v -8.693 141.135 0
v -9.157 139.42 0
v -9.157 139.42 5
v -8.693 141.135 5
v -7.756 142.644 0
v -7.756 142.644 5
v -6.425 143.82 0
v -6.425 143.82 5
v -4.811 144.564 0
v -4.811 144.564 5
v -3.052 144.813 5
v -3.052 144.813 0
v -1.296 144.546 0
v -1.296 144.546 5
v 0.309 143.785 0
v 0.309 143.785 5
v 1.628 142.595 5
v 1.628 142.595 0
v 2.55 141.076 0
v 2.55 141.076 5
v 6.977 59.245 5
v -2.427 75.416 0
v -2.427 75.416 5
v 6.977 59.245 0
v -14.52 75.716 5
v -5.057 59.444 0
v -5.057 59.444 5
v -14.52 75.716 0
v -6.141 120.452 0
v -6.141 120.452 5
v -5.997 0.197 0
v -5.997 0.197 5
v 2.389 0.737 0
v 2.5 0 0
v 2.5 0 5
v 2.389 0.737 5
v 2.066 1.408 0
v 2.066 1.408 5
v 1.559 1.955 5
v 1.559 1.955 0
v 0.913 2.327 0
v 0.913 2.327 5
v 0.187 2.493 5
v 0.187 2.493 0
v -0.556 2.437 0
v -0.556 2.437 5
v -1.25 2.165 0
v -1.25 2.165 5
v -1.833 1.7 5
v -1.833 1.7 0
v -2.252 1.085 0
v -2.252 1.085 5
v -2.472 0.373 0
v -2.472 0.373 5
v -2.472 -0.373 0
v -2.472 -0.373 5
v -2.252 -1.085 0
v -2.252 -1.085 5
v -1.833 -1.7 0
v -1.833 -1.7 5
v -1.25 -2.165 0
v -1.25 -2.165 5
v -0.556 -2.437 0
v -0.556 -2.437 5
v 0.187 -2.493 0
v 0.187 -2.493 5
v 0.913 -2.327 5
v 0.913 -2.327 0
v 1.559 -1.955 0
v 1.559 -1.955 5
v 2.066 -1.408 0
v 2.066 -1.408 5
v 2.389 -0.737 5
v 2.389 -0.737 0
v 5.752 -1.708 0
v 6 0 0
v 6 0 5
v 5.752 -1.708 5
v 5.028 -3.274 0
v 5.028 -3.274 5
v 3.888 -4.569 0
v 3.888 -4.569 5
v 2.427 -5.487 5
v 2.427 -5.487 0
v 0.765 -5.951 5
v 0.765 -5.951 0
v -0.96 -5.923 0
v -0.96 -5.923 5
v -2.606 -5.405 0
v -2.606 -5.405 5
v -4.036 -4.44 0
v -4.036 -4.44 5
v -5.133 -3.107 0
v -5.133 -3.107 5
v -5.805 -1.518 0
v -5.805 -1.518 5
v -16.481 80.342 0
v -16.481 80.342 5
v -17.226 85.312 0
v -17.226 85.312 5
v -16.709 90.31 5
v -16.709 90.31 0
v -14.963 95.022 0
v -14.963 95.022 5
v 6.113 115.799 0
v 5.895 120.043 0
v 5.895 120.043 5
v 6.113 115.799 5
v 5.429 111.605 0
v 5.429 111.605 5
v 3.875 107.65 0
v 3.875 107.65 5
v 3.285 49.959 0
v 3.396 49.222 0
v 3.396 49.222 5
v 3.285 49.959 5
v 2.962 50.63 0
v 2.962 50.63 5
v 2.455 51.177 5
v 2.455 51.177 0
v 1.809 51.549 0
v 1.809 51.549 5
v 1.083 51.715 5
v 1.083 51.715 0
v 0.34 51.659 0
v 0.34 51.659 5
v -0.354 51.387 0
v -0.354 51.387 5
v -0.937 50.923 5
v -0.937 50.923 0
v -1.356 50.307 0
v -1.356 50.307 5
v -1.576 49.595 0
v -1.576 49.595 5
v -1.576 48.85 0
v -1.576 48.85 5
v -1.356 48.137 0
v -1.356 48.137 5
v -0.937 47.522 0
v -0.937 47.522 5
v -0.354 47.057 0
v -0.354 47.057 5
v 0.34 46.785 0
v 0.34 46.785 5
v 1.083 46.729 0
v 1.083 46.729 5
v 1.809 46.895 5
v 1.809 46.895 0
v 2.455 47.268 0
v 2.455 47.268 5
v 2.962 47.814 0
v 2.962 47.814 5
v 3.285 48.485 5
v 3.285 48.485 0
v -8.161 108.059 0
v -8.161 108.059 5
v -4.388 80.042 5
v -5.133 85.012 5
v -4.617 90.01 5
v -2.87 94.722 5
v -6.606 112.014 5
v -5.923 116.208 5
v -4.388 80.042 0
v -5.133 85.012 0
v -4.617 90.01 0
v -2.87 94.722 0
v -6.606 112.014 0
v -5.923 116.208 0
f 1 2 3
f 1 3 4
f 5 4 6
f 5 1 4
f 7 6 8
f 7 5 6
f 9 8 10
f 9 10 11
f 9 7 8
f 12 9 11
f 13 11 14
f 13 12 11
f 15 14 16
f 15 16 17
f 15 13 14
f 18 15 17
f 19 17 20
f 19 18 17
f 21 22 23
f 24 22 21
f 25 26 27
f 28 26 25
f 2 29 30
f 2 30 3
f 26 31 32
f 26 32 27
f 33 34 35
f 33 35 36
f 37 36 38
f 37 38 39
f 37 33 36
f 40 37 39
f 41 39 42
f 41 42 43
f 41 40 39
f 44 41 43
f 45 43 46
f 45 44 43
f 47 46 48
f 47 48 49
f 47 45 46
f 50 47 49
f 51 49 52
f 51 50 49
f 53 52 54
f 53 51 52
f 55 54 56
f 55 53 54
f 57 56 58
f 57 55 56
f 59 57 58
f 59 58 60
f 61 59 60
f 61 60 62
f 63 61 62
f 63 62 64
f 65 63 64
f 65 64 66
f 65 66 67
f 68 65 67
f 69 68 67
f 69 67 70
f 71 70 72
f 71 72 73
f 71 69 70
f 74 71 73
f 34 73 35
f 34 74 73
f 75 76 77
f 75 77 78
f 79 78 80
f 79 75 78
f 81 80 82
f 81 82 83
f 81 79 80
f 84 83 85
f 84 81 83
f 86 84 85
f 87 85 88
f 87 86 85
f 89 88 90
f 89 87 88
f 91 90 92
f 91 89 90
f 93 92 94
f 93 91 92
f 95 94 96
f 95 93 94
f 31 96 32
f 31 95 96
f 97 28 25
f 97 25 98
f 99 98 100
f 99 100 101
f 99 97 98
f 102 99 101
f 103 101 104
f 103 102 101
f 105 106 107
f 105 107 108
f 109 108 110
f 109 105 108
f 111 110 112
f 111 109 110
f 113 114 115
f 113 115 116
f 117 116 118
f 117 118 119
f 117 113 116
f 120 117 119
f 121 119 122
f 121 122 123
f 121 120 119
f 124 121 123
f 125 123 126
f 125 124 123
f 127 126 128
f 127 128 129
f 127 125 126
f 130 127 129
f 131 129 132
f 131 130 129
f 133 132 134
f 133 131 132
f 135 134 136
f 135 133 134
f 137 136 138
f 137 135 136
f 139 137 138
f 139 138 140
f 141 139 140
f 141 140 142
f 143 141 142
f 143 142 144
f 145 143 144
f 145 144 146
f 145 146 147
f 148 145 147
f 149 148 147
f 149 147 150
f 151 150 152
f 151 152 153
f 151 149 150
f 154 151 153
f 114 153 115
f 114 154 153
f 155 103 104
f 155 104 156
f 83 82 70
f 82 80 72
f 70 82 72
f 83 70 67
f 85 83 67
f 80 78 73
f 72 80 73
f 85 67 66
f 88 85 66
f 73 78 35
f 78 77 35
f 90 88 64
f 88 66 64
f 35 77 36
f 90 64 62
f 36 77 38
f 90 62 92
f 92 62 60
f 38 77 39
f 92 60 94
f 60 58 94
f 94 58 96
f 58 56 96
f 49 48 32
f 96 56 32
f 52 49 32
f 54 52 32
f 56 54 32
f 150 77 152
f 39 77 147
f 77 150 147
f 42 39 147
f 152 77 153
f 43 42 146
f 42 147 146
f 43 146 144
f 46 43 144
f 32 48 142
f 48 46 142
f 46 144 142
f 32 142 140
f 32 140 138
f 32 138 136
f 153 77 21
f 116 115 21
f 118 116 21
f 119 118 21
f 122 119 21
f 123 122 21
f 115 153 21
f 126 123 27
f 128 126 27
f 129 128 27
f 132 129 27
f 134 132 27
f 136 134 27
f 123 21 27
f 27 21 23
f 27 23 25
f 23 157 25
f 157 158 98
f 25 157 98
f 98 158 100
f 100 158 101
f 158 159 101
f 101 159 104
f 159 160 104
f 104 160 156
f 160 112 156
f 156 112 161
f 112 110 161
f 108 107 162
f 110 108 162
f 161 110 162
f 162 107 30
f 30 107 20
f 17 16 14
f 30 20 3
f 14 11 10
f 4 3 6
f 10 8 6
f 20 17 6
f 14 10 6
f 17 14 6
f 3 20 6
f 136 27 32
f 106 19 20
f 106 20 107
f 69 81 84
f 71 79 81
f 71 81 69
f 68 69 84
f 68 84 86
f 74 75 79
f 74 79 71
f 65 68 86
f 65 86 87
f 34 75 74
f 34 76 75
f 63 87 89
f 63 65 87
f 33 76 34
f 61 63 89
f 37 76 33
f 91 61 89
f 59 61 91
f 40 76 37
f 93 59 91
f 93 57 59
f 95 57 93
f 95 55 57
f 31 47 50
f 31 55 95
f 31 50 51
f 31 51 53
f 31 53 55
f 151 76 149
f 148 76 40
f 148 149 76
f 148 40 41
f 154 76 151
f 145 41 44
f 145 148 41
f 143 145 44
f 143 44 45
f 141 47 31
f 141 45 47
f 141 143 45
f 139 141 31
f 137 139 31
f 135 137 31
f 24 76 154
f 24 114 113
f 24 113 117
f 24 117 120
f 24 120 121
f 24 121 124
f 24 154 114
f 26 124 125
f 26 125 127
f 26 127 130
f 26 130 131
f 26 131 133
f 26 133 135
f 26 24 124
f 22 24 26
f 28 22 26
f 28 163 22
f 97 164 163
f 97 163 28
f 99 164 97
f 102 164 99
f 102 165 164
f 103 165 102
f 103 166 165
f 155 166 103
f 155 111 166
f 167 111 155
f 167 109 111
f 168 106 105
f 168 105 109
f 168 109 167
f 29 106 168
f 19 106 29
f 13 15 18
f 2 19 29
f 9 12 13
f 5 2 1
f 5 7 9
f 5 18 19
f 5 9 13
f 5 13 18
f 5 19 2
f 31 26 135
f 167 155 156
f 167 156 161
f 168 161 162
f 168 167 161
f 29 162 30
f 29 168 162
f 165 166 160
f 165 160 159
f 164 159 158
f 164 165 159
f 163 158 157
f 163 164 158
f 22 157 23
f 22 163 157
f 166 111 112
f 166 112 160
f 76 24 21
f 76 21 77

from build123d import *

# Parameters (mm, degrees)
SKETCH_1_R      = 2.5
EXTRUDE_1_DEPTH = 5


with BuildPart() as part:
    # Эскиз1 → Вытянуть1 (new body)
    with BuildSketch(Plane.XY):
        with BuildLine():
            Line((-5.996779713, 0.196552972), (-5.056999721, 59.443873761))
            Line((-5.056999721, 59.443873761), (-14.520173102, 75.715501286))
            ThreePointArc((-14.520173102, 75.715501286), (-17.226120819, 85.311611147), (-14.963001631, 95.021697091))
            Line((-14.963001631, 95.021697091), (-8.160722176, 108.059141137))
            ThreePointArc((-8.160722176, 108.059141137), (-6.152874831, 114.092941719), (-6.140599008, 120.452033615))
            Line((-6.140599008, 120.452033615), (-9.157402478, 139.420199329))
            ThreePointArc((-9.157402478, 139.420199329), (-3.940932329, 144.75283841), (2.549919095, 141.076230168))
            Line((2.549919095, 141.076230168), (5.89519306, 120.042804706))
            ThreePointArc((5.89519306, 120.042804706), (5.882917236, 113.68371281), (3.875069891, 107.649912228))
            Line((3.875069891, 107.649912228), (-2.87016044, 94.721810171))
            ThreePointArc((-2.87016044, 94.721810171), (-5.133279628, 85.011724227), (-2.42733191, 75.415614366))
            Line((-2.42733191, 75.415614366), (6.976825569, 59.245462816))
            Line((6.976825569, 59.245462816), (6, 0))
            ThreePointArc((6, 0), (-0.098289675, -5.999194874), (-5.996779713, 0.196552972))
        make_face()
        Circle(SKETCH_1_R, mode=Mode.SUBTRACT)
        with Locations((0.896058218, 49.222155117)):
            Circle(SKETCH_1_R, mode=Mode.SUBTRACT)
    extrude(amount=EXTRUDE_1_DEPTH)


solid = part.part
